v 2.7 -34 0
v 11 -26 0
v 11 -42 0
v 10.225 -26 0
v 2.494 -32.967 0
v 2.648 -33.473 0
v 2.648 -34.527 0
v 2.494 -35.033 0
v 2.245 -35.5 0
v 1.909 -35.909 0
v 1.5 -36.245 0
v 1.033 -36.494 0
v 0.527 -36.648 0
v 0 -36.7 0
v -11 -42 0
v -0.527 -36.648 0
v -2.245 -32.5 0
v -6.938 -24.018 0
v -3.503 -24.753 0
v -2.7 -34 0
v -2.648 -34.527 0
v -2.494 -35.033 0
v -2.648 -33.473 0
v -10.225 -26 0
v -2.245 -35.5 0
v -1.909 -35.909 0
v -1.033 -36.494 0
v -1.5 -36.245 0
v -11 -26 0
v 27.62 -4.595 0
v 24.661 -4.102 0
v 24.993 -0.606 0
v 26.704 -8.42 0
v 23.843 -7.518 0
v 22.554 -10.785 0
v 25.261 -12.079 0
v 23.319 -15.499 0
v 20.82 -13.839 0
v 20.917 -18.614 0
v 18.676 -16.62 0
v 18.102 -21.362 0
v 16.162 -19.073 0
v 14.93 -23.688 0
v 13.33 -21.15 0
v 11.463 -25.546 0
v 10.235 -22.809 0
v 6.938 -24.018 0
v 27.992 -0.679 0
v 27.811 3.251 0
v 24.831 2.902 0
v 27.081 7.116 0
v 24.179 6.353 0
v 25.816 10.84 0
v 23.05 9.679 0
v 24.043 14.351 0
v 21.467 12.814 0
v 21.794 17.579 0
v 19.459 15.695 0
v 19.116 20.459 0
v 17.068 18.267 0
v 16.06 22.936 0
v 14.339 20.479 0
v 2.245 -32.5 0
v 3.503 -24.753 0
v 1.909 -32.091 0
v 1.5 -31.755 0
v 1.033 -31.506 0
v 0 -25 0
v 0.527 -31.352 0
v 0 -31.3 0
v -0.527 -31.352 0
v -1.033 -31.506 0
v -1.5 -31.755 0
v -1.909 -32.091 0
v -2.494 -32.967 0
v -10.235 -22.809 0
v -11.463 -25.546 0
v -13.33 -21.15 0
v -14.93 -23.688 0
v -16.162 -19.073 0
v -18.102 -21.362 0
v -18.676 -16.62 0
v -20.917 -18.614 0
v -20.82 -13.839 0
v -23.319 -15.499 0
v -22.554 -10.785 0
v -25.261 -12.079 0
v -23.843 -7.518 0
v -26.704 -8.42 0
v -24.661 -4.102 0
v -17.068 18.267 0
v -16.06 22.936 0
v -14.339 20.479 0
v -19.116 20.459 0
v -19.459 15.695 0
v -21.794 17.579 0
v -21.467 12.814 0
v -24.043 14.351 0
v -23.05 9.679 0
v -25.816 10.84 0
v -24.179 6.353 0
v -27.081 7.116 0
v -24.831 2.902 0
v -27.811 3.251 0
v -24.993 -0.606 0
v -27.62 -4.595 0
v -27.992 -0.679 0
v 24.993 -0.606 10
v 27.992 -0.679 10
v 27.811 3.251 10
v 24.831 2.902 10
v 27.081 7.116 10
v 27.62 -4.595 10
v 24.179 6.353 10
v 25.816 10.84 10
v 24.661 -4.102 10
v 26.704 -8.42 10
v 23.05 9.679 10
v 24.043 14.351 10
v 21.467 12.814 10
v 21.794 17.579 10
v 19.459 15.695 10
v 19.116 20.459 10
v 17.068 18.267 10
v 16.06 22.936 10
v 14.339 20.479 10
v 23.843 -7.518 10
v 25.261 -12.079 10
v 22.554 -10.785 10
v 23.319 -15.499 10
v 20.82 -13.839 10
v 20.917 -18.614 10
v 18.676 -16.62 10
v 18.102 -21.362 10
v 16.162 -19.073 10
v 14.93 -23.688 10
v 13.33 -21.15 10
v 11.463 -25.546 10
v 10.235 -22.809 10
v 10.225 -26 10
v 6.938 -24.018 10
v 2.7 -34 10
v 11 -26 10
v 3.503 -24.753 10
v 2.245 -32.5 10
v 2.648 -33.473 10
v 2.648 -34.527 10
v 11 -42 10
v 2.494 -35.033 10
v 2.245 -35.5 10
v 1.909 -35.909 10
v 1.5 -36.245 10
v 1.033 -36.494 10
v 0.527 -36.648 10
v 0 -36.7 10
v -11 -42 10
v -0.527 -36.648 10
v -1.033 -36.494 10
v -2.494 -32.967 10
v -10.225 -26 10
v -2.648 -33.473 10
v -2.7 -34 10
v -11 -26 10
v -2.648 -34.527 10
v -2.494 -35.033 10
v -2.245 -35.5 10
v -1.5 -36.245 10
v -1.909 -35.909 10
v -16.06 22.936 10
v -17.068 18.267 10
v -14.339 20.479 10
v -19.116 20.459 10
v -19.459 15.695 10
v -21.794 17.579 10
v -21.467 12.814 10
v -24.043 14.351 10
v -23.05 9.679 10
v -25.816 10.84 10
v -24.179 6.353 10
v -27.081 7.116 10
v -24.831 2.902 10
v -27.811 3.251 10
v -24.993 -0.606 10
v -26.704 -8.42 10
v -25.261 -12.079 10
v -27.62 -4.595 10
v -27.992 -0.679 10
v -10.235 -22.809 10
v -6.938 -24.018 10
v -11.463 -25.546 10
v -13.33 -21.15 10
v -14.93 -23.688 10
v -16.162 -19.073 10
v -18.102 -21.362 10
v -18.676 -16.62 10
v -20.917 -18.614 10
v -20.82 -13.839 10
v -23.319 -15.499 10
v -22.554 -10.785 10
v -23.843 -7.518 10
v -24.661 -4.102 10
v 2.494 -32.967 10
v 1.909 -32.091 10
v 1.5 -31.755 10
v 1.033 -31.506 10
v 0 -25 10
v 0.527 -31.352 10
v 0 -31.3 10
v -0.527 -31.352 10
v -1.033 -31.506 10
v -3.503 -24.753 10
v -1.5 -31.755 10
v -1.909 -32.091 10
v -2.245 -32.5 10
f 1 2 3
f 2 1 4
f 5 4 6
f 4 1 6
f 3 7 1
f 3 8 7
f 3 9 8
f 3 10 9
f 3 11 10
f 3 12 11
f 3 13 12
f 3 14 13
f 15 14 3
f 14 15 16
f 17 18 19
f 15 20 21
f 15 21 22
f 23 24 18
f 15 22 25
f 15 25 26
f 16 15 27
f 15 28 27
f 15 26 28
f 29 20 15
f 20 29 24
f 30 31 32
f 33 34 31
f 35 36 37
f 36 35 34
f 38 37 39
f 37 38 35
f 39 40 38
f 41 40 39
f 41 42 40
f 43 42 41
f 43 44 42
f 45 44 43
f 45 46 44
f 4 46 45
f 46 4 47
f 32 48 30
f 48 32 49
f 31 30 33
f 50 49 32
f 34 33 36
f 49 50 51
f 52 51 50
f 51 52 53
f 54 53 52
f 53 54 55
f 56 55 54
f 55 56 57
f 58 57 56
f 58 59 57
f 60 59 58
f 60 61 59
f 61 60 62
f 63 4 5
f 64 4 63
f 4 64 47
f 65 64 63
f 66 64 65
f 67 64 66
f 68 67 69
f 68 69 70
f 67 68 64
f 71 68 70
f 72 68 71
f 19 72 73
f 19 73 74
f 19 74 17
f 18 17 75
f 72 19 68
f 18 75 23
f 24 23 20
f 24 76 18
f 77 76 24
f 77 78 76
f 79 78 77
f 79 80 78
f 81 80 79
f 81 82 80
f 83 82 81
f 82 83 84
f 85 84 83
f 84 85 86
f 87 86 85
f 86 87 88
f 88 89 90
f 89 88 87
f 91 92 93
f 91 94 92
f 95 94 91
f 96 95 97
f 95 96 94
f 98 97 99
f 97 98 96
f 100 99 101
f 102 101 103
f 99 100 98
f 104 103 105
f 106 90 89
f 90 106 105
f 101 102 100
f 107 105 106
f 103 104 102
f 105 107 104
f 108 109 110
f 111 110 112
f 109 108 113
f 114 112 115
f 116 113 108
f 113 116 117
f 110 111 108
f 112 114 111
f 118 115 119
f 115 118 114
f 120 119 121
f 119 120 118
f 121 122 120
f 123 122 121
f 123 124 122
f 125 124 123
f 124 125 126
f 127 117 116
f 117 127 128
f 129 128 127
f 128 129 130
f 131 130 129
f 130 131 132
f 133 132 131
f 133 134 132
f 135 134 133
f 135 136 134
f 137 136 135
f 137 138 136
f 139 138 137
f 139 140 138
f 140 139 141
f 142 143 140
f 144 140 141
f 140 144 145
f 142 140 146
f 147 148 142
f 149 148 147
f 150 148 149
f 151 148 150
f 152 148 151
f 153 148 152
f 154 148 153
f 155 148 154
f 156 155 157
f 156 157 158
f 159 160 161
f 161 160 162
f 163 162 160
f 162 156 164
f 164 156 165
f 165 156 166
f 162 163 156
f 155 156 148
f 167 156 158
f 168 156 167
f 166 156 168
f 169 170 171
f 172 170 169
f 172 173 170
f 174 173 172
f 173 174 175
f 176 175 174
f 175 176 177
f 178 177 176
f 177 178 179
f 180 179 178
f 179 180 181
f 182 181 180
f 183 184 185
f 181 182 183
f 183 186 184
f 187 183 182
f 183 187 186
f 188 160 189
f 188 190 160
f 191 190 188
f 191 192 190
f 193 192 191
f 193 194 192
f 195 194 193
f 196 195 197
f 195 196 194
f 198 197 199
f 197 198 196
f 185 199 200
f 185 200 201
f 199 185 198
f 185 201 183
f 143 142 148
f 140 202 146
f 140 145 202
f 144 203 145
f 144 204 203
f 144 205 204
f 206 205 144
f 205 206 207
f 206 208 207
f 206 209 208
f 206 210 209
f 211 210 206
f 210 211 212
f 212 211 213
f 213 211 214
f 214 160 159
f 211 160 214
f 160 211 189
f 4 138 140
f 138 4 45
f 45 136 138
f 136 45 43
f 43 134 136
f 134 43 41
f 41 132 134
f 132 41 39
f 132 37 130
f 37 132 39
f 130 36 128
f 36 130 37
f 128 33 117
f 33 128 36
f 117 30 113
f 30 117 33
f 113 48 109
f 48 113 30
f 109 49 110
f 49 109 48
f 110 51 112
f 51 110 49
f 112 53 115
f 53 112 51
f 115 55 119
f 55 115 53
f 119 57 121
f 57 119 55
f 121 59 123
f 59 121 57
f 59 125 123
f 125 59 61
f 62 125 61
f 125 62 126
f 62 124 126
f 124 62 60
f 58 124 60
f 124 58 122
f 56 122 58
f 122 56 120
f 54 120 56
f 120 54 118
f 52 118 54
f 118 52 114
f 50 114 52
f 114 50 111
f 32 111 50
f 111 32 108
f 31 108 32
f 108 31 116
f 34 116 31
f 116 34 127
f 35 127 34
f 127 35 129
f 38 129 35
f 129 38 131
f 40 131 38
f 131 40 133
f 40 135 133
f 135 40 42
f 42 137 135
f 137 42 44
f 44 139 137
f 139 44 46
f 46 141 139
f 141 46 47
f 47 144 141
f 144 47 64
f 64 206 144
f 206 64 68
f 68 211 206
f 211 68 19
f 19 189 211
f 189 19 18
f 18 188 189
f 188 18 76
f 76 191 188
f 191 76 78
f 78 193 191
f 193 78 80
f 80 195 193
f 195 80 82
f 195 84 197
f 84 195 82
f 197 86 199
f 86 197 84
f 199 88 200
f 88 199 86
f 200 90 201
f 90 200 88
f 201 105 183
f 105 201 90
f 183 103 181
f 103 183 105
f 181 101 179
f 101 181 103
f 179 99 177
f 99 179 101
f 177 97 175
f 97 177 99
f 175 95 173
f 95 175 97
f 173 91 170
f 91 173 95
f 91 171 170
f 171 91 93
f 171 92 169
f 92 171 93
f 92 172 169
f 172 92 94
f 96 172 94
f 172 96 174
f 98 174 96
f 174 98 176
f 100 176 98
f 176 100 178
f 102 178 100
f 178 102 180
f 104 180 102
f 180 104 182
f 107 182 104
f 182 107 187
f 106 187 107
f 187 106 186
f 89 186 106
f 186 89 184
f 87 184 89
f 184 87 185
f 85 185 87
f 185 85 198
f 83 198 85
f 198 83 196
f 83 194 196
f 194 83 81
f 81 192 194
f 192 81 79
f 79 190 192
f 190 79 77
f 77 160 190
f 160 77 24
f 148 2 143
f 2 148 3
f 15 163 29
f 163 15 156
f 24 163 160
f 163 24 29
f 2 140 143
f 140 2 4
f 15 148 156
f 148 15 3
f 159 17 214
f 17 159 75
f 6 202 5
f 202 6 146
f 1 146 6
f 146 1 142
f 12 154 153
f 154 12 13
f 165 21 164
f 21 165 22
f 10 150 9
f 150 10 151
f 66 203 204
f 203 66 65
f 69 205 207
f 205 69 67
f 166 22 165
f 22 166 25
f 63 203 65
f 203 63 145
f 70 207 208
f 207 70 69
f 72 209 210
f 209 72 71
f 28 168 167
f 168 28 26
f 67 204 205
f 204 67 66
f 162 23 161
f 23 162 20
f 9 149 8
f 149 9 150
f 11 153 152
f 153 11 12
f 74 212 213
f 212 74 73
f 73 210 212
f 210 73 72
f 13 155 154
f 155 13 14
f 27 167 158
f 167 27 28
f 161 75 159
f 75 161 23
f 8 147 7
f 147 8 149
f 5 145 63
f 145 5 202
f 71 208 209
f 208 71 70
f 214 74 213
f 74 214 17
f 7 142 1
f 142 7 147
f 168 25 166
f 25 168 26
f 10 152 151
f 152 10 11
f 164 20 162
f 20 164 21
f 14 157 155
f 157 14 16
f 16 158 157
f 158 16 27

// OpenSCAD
$fn = 32;

// ----------------------------------------------------------------------
// Spring clip: 56 mm outside, 3 mm band, 70 degree opening
// ----------------------------------------------------------------------

// --- parameters (mm) ---
outer_r = 28;             // clip outside radius
inner_r = 25;             // clip bore radius
band = 3;                 // band thickness
clip_w = 10;              // clip width
opening = 70;             // opening angle
tab_w = 22;               // tab width
tab_len = 14;             // tab length past the clip
tab_hole = 5.4;           // tab fixing hole

clip_profile = [[-16.06, 22.936], [-19.116, 20.459], [-21.794, 17.579], [-24.043, 14.351], [-25.816, 10.84], [-27.081, 7.116], [-27.811, 3.251], [-27.992, -0.679], [-27.62, -4.595], [-26.704, -8.42], [-25.261, -12.079], [-23.319, -15.499], [-20.917, -18.614], [-18.102, -21.362], [-14.93, -23.688], [-11.463, -25.546], [-7.77, -26.9], [-3.924, -27.724], [0, -28], [3.924, -27.724], [7.77, -26.9], [11.463, -25.546], [14.93, -23.688], [18.102, -21.362], [20.917, -18.614], [23.319, -15.499], [25.261, -12.079], [26.704, -8.42], [27.62, -4.595], [27.992, -0.679], [27.811, 3.251], [27.081, 7.116], [25.816, 10.84], [24.043, 14.351], [21.794, 17.579], [19.116, 20.459], [16.06, 22.936], [14.339, 20.479], [17.068, 18.267], [19.459, 15.695], [21.467, 12.814], [23.05, 9.679], [24.179, 6.353], [24.831, 2.902], [24.993, -0.606], [24.661, -4.102], [23.843, -7.518], [22.554, -10.785], [20.82, -13.839], [18.676, -16.62], [16.162, -19.073], [13.33, -21.15], [10.235, -22.809], [6.938, -24.018], [3.503, -24.753], [0, -25], [-3.503, -24.753], [-6.938, -24.018], [-10.235, -22.809], [-13.33, -21.15], [-16.162, -19.073], [-18.676, -16.62], [-20.82, -13.839], [-22.554, -10.785], [-23.843, -7.518], [-24.661, -4.102], [-24.993, -0.606], [-24.831, 2.902], [-24.179, 6.353], [-23.05, 9.679], [-21.467, 12.814], [-19.459, 15.695], [-17.068, 18.267], [-14.339, 20.479]];

difference() {
  union() {
    linear_extrude(height = clip_w) polygon(clip_profile);
    /* mounting tab, sunk 2 mm into the band */
    translate([-11, -42, 0]) cube([tab_w, 16, clip_w]);
  }
  translate([0, -34, -2.5]) cylinder(h = clip_w + 5, d = tab_hole);
}
